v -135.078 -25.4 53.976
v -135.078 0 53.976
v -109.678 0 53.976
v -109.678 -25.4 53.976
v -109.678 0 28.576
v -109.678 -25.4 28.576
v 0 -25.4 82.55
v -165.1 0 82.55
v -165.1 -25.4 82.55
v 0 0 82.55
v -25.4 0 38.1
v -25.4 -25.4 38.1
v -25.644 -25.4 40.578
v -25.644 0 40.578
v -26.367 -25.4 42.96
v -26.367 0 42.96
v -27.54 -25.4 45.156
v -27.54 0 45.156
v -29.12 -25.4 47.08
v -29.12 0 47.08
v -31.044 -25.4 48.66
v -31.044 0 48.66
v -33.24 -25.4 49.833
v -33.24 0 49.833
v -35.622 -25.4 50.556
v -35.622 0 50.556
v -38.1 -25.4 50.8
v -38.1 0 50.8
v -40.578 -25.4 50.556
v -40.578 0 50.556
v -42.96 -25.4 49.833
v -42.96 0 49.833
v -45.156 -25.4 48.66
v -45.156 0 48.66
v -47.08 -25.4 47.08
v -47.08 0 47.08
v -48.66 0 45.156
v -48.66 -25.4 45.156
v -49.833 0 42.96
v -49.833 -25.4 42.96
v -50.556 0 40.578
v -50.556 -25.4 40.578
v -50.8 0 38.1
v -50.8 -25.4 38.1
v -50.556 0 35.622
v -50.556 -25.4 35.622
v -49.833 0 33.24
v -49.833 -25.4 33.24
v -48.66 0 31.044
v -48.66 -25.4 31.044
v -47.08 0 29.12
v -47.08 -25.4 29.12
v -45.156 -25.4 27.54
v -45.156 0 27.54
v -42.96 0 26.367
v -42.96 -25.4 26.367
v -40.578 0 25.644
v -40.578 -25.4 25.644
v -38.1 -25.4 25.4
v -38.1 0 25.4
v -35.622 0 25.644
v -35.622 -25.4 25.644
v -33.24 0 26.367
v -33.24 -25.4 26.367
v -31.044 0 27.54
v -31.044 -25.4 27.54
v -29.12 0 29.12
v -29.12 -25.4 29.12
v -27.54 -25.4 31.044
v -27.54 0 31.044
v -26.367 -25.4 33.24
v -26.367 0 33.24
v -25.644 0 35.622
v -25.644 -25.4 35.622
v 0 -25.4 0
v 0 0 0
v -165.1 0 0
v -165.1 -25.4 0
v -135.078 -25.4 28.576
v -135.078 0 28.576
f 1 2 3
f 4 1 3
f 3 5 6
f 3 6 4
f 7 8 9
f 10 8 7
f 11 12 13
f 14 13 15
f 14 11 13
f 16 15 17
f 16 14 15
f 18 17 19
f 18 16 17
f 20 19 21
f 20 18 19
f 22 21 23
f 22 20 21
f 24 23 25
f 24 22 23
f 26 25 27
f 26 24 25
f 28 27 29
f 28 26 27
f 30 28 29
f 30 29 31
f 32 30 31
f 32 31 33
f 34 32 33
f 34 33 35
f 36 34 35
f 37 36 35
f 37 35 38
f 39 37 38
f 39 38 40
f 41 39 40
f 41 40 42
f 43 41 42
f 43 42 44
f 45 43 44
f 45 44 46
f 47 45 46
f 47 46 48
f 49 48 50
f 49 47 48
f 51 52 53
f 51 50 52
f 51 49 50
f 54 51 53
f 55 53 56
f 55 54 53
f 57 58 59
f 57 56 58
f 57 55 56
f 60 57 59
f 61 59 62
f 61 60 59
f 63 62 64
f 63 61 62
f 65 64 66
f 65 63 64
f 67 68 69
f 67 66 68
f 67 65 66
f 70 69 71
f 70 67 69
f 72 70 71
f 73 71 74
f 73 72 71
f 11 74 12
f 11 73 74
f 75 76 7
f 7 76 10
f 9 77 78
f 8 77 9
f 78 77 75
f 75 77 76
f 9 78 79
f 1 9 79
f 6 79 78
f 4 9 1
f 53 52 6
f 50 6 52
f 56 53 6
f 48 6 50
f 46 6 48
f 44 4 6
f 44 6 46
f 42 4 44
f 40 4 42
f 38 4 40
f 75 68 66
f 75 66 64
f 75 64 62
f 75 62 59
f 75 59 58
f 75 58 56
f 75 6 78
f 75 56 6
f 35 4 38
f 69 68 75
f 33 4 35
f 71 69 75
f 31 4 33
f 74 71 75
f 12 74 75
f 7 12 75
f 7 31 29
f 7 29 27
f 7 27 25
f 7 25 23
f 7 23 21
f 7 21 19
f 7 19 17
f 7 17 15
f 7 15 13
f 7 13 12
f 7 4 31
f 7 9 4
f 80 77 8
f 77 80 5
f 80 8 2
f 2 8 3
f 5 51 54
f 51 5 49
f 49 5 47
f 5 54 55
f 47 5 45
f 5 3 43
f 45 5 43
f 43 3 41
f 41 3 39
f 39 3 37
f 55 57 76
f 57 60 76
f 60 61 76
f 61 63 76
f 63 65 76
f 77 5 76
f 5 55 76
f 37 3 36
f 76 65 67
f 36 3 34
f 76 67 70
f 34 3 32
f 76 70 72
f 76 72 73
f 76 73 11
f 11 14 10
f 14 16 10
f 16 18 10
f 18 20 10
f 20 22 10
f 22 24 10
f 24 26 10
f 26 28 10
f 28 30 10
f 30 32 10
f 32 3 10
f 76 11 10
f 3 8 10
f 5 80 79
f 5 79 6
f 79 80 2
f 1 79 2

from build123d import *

# Parameters (mm, degrees)
F0_W     = 165.1
F0_H     = 82.55
F3_DEPTH = 25.4
F1_W     = 25.4
F1_H     = 25.4
F4_DEPTH = 812.8
F2_R     = 12.7
F5_DEPTH = 1752.6


with BuildPart() as f3:
    # F0 (on Front) → F3 (new body)
    with BuildSketch(Plane.XZ):
        with Locations((-82.55, 41.275)):
            Rectangle(F0_W, F0_H)
    extrude(amount=F3_DEPTH)

    # F1 (on face) → F4 (cut)
    with BuildSketch(Plane.XZ):
        with Locations((-122.377806, 41.276296)):
            Rectangle(F1_W, F1_H)
    extrude(amount=F4_DEPTH, mode=Mode.SUBTRACT)

    # F2 (on face) → F5 (cut)
    with BuildSketch(Plane.XZ):
        with Locations((-38.1, 38.1)):
            Circle(F2_R)
    extrude(amount=F5_DEPTH, mode=Mode.SUBTRACT)


solid = f3.part
